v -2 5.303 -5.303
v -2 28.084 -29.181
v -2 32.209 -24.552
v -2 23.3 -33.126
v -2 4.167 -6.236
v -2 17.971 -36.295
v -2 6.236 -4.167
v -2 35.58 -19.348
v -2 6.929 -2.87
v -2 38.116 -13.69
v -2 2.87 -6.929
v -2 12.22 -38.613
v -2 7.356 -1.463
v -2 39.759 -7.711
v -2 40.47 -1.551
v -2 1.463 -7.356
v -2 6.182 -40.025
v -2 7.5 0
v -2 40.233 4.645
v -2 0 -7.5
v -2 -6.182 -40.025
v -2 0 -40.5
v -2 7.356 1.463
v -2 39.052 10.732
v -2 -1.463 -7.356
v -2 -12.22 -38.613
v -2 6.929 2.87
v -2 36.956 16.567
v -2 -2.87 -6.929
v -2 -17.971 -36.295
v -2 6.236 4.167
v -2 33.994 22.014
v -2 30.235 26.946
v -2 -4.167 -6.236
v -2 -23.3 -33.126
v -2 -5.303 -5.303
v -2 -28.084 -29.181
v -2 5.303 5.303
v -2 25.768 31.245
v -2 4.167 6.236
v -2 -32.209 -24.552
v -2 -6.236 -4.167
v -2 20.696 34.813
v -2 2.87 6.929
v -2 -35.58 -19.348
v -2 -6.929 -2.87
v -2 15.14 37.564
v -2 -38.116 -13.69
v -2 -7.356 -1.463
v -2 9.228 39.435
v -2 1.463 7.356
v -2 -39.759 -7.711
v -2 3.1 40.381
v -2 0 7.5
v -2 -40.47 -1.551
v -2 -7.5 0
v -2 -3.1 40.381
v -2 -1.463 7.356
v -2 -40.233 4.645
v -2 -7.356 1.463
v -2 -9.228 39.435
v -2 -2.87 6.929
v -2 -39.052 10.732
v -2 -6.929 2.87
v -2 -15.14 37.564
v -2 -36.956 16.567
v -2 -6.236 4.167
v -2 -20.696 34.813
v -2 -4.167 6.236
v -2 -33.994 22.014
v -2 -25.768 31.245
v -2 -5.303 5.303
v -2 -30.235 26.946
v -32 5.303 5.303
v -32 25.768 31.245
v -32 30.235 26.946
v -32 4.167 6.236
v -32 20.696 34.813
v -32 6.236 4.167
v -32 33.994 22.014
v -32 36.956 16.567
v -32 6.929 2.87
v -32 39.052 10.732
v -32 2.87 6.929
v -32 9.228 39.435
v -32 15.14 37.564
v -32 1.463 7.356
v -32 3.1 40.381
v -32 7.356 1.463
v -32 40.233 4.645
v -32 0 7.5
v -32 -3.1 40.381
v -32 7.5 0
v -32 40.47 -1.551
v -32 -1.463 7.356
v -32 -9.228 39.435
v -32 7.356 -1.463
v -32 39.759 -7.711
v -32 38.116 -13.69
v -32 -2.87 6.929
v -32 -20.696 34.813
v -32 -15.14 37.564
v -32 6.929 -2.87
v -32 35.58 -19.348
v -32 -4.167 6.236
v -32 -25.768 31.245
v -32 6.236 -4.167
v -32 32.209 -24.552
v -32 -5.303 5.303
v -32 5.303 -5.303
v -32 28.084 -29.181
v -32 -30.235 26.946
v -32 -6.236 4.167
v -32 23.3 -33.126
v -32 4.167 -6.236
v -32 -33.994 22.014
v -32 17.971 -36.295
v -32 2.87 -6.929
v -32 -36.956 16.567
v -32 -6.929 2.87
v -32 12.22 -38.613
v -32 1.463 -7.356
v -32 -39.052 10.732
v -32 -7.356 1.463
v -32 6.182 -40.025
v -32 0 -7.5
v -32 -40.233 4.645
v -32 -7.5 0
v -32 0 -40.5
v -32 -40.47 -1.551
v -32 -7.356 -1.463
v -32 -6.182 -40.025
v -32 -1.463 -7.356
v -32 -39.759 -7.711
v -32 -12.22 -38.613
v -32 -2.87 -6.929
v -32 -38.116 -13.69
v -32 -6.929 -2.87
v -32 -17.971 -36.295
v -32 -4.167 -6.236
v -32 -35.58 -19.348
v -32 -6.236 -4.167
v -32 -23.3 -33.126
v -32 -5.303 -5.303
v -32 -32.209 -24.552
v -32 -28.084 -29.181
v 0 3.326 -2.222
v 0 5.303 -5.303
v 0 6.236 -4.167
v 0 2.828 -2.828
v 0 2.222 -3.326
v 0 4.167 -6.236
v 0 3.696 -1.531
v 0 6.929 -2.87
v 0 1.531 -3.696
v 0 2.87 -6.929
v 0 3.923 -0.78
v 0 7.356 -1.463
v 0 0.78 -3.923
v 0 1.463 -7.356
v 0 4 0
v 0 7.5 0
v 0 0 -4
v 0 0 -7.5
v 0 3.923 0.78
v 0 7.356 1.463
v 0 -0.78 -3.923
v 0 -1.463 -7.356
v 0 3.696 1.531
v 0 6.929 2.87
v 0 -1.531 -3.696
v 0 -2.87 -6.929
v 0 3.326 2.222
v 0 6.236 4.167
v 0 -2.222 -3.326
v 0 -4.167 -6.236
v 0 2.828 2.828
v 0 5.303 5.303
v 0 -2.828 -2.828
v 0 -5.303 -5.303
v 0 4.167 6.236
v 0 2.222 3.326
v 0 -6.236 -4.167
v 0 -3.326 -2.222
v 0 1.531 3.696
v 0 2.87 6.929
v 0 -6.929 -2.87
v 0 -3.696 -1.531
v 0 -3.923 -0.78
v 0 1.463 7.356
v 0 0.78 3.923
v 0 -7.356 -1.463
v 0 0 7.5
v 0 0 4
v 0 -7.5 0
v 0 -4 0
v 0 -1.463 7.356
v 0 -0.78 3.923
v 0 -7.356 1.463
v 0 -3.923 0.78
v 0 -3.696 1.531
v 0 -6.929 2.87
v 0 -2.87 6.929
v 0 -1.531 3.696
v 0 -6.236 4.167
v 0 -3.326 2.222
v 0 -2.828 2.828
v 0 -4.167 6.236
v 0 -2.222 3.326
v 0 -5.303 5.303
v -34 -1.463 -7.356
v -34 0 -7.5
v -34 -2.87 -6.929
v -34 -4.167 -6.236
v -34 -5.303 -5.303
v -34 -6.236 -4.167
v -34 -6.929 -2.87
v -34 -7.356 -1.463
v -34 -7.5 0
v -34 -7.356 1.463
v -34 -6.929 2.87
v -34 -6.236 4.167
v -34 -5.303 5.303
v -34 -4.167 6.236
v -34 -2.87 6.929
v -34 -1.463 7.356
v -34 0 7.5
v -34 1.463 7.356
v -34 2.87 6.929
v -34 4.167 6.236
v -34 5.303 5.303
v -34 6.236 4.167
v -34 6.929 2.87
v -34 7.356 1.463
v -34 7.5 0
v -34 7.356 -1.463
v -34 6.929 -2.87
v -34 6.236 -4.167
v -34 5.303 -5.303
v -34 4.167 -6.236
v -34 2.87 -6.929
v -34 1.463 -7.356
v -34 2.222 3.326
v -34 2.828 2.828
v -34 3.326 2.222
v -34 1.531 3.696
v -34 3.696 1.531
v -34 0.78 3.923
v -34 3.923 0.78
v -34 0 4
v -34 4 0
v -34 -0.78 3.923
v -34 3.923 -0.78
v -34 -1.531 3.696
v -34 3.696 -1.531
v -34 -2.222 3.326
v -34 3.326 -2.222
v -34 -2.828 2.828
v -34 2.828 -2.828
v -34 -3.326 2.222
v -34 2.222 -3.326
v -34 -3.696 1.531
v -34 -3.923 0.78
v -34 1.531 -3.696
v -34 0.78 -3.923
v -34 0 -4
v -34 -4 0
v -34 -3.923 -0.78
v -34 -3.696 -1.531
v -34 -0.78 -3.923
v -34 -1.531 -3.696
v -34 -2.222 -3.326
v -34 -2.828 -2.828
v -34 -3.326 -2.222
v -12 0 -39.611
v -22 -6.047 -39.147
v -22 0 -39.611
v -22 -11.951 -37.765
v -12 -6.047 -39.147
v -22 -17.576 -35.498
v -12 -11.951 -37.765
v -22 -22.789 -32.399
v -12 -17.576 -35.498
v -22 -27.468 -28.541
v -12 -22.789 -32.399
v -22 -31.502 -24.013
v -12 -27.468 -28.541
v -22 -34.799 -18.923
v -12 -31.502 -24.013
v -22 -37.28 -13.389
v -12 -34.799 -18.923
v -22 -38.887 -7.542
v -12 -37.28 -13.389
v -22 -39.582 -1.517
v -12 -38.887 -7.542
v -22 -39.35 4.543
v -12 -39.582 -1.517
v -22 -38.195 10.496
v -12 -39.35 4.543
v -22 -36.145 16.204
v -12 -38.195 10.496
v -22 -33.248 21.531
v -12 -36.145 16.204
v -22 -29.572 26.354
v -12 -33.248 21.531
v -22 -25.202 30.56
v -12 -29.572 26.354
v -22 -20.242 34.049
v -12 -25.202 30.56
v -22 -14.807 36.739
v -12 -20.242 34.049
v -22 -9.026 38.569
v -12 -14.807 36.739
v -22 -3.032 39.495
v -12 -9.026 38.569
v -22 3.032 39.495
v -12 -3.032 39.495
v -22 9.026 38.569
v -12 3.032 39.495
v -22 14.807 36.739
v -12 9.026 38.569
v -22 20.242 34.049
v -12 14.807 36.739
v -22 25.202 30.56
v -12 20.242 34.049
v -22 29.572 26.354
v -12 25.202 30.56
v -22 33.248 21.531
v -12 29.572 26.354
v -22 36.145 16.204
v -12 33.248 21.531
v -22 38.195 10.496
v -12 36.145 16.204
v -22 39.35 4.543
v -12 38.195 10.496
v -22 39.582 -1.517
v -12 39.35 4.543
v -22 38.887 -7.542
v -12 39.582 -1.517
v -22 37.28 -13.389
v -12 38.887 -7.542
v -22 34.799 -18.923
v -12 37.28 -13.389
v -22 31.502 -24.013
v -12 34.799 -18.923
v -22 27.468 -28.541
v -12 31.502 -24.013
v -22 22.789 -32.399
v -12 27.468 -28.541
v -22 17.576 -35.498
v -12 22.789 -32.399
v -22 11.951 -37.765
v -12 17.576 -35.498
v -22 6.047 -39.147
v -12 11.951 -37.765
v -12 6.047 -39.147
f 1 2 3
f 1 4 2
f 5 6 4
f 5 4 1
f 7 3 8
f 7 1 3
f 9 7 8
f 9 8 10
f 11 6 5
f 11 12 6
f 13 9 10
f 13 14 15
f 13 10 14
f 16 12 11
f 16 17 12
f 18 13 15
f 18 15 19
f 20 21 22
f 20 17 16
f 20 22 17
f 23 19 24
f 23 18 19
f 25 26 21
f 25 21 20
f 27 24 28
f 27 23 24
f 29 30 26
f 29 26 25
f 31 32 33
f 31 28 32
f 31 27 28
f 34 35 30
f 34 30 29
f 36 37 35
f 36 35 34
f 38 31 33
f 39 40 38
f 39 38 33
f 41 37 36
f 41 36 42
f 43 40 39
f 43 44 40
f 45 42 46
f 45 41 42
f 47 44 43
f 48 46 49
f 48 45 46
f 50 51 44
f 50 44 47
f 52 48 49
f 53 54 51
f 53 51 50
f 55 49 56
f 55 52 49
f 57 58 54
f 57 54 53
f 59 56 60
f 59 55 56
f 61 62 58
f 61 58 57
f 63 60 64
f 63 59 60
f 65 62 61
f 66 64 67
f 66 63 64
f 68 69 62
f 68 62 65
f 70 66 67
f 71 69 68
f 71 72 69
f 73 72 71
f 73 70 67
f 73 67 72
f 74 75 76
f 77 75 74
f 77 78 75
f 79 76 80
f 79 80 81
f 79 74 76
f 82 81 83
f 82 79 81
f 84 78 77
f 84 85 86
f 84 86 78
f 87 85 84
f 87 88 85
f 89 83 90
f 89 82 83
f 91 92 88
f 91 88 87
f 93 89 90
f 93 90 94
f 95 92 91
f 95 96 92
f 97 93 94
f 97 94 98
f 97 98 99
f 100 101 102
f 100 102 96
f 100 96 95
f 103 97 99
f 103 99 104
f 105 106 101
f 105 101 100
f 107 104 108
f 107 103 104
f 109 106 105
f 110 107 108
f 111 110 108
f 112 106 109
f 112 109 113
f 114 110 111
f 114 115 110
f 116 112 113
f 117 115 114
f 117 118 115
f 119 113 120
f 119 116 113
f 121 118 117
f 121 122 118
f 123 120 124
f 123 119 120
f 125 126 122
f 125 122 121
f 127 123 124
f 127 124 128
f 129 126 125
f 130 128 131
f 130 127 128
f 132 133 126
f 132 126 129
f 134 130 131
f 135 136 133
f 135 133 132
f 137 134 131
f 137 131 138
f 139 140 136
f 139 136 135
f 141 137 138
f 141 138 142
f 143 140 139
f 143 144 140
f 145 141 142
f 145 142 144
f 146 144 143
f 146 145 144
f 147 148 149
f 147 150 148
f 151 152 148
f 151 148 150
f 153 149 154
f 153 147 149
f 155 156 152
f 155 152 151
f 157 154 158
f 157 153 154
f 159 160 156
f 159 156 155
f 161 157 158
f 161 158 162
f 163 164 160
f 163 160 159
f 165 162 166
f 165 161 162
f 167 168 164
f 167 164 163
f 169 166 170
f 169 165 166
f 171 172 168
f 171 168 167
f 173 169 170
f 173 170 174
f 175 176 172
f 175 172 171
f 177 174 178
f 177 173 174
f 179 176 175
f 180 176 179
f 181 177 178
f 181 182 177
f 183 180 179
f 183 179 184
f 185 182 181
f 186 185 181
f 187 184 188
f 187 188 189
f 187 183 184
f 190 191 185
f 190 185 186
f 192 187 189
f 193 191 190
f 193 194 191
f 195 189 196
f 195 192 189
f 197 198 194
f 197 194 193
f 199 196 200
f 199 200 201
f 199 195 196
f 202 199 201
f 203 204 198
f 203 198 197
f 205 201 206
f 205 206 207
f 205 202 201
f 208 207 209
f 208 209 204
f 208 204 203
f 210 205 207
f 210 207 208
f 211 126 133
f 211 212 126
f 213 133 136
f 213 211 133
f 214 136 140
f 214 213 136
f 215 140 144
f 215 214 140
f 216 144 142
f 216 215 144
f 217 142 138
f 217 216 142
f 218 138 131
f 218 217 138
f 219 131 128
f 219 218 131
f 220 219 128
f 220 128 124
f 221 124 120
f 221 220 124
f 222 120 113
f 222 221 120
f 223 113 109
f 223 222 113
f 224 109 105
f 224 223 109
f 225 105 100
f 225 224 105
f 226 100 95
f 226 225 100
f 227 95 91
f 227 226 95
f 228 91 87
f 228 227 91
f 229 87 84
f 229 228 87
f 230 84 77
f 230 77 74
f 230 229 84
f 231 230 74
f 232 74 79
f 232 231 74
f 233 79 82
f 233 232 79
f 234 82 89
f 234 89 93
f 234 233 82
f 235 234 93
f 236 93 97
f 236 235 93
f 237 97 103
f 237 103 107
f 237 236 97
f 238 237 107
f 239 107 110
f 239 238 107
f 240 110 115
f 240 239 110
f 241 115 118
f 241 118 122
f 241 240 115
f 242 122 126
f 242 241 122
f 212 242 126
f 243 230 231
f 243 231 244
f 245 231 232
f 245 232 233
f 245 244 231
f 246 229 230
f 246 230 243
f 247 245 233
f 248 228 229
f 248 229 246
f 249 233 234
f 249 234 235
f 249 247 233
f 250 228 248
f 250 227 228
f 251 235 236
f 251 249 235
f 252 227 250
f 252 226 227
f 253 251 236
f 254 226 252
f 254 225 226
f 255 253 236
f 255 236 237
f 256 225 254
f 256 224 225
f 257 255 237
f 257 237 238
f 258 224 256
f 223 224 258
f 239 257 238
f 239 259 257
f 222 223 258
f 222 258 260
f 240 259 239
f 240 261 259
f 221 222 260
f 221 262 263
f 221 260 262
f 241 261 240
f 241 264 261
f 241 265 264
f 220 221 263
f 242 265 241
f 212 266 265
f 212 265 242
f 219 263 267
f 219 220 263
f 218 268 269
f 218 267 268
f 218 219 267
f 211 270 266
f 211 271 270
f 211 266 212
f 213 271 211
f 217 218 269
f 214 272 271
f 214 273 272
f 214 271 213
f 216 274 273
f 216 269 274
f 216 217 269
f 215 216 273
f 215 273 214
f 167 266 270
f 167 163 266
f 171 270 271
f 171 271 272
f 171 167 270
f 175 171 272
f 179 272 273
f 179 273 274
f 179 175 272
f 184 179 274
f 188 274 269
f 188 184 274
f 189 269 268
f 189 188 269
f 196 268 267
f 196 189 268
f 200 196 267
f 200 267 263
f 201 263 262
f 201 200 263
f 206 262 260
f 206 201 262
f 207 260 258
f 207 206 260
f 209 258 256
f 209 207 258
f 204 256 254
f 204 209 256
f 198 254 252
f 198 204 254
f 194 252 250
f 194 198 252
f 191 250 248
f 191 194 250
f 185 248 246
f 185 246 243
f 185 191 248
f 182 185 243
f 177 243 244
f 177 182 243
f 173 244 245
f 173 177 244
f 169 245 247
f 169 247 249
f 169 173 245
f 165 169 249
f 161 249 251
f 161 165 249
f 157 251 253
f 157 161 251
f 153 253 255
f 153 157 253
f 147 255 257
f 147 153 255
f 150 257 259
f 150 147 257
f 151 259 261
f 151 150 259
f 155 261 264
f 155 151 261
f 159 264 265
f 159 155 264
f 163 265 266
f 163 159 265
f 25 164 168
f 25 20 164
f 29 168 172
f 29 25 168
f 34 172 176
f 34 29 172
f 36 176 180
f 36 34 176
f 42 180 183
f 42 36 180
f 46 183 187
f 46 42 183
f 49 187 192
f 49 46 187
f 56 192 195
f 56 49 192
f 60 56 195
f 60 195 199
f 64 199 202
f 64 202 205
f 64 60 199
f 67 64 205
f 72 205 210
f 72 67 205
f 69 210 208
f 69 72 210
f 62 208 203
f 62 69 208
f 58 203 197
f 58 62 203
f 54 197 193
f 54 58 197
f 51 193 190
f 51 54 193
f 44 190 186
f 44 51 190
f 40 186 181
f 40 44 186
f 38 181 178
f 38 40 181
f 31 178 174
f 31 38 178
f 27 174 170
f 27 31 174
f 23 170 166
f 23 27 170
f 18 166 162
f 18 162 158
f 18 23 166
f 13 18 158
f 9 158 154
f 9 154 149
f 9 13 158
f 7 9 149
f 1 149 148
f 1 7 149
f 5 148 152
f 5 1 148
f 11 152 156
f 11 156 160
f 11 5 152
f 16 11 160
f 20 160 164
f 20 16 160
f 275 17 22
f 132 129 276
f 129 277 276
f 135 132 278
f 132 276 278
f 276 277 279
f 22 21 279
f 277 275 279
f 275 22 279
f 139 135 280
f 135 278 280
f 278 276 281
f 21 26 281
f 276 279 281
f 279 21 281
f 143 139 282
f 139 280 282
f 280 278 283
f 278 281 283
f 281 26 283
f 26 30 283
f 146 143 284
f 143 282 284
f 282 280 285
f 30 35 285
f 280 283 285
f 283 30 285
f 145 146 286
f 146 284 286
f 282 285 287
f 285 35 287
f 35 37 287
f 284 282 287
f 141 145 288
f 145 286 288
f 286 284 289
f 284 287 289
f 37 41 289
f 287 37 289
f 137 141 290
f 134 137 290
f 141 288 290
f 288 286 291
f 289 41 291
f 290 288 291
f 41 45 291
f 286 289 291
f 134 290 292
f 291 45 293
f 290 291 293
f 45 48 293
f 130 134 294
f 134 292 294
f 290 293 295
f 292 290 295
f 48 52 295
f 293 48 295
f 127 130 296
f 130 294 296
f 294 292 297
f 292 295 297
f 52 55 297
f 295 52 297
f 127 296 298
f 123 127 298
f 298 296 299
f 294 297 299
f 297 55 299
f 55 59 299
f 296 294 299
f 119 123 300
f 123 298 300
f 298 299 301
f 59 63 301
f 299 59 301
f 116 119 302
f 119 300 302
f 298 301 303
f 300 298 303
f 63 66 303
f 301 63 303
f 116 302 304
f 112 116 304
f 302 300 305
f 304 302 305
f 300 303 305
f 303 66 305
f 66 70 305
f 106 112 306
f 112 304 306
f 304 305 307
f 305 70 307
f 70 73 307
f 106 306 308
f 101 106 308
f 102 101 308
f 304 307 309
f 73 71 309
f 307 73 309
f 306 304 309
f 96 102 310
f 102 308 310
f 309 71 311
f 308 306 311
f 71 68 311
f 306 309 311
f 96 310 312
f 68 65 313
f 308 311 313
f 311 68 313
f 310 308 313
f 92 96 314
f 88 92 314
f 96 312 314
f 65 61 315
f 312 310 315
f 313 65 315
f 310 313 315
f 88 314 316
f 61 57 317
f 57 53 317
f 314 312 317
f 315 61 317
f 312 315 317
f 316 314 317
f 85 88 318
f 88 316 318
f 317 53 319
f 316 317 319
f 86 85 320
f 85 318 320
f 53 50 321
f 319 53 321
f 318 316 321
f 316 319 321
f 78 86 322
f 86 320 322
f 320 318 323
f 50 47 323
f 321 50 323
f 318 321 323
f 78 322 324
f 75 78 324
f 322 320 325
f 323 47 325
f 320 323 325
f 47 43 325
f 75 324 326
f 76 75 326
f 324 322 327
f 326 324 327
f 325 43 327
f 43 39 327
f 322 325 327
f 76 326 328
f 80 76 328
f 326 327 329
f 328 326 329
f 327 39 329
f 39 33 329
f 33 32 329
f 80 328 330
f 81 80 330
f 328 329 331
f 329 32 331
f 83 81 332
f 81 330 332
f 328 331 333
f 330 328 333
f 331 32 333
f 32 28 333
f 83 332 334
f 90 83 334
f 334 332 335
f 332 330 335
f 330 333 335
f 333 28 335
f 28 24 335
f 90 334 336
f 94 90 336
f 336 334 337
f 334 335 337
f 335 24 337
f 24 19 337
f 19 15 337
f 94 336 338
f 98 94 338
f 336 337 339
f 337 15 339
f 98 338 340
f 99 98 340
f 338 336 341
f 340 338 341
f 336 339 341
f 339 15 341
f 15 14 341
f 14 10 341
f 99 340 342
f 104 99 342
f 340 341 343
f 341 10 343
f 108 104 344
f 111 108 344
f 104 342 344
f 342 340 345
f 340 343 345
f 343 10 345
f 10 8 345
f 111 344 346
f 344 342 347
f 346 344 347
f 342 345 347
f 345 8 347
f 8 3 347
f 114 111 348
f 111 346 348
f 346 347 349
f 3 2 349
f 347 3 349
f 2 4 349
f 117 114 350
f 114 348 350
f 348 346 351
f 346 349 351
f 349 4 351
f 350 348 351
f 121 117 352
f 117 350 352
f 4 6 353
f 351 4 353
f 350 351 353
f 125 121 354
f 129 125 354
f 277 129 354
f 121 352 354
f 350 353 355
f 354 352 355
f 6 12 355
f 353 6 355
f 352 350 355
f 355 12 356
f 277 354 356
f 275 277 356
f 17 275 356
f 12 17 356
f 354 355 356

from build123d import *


with BuildPart() as part:
    # Sketch1 → Revolve1 (revolve)
    with BuildSketch(Plane.XY, mode=Mode.PRIVATE) as revolve1_sk:
        with BuildLine():
            Line((-34, 7.5), (-34, 4))
            Line((-34, 4), (0, 4))
            Line((0, 4), (0, 7.5))
            Line((0, 7.5), (-2, 7.5))
            Line((-2, 7.5), (-2, 40.5))
            add(Edge.make_bspline(
                [(-32, 40.5), (-17, 38.5), (-2, 40.5)],
                knots=[0, 0, 0, 1, 1, 1], degree=2))
            Line((-32, 40.5), (-32, 7.5))
            Line((-32, 7.5), (-34, 7.5))
        make_face()
    revolve(revolve1_sk.sketch.rotate(Axis((0, 0, 0), (-1, 0, 0)), 90), axis=Axis((0, 0, 0), (-1, 0, 0)))


solid = part.part
